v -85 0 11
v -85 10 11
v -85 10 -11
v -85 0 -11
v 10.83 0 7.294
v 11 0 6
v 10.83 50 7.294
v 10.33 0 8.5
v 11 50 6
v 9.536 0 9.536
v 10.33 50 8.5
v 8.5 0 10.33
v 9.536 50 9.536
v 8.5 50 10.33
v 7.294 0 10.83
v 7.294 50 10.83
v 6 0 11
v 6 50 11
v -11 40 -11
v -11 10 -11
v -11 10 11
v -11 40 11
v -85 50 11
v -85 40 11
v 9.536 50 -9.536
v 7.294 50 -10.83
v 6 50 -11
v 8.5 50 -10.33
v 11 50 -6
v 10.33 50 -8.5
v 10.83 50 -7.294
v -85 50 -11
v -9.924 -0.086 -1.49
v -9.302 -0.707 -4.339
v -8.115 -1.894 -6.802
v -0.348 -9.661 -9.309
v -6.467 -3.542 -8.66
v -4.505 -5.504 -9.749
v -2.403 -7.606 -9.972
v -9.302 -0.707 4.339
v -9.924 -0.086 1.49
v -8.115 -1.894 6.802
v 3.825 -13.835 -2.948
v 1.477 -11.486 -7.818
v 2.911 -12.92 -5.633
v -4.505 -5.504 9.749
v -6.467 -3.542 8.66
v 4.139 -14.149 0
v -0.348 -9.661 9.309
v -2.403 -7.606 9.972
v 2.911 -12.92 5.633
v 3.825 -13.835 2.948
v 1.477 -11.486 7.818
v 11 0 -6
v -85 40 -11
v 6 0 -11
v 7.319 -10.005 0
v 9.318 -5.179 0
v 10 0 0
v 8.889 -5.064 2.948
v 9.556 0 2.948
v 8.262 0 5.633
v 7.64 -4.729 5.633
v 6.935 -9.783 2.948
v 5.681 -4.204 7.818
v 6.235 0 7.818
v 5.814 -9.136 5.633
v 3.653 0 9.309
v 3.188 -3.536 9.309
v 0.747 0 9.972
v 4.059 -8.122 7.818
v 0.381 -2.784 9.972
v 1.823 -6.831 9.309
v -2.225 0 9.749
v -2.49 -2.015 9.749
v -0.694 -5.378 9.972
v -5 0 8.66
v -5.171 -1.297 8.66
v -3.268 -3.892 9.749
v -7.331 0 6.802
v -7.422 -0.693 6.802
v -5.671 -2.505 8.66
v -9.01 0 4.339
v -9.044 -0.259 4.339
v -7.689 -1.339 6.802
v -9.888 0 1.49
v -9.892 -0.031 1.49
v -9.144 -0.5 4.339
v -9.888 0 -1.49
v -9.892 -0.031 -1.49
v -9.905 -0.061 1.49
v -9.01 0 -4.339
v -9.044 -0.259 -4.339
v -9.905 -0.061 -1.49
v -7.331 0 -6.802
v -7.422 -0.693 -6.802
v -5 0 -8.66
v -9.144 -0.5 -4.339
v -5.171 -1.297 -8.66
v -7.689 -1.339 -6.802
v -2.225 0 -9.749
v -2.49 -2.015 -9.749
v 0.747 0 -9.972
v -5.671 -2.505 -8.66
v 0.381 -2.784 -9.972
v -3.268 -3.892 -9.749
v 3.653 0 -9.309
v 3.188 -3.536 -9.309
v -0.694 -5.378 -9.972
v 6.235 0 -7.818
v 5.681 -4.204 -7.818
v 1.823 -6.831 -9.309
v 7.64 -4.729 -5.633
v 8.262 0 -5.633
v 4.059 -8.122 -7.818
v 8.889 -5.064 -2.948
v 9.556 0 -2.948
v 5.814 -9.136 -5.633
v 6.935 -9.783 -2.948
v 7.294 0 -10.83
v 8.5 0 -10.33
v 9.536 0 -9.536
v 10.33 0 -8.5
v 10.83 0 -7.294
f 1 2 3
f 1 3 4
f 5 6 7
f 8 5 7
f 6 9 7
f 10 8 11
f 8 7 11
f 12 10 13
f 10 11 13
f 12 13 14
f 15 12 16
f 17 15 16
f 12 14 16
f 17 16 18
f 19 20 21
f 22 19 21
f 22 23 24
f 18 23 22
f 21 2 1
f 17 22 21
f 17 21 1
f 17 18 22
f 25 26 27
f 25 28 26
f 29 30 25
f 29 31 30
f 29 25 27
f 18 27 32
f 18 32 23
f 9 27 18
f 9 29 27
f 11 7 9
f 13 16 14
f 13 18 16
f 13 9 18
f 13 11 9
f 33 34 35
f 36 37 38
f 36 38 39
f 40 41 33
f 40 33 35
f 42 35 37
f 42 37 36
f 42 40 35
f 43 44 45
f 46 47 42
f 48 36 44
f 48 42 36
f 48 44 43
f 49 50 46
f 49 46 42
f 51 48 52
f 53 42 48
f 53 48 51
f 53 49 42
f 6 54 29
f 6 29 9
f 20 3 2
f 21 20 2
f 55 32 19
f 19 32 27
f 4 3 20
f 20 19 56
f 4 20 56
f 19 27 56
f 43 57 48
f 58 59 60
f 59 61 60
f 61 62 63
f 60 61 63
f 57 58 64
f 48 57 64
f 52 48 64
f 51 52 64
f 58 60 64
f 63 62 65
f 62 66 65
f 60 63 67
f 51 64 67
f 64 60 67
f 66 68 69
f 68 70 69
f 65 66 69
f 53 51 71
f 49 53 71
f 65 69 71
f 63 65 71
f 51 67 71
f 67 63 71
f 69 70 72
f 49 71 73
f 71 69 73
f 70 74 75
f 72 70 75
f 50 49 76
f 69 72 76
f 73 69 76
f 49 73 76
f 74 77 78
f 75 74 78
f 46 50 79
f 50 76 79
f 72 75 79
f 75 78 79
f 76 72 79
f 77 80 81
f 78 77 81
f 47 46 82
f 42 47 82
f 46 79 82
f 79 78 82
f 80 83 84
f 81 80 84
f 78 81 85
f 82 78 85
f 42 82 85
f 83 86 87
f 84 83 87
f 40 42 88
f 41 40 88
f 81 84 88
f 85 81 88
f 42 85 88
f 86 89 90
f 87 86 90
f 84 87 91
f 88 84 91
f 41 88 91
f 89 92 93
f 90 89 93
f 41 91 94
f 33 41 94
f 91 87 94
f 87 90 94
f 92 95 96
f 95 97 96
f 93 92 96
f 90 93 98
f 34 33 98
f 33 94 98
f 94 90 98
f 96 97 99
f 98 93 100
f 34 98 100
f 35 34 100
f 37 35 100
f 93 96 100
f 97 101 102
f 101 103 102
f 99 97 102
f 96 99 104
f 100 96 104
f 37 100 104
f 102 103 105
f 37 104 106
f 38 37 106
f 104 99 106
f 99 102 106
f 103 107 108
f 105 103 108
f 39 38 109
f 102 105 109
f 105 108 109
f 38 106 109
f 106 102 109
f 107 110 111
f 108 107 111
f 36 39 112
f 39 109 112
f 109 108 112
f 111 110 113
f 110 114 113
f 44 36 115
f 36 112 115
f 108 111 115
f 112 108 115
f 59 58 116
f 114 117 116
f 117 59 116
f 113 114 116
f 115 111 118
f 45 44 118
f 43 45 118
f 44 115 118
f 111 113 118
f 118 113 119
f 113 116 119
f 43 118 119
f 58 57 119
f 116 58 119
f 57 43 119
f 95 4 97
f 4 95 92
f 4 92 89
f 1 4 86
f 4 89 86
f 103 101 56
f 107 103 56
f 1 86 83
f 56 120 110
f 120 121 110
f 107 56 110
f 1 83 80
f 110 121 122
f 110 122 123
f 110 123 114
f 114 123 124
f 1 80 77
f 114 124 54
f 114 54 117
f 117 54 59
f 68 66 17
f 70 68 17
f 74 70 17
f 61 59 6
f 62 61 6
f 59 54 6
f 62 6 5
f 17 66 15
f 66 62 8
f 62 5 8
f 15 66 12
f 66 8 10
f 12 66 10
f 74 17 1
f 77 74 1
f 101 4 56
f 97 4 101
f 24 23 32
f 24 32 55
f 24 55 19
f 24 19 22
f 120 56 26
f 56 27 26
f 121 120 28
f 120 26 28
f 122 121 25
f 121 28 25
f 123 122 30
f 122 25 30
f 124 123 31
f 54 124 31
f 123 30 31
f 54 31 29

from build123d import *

# Parameters (mm, degrees)
F0_R     = 10
F2_ANGLE = 45
F3_W     = 22
F3_H     = 22
F3_R     = 10
F4_DEPTH = 50
F5_W     = 10
F5_H     = 22
F6_DEPTH = 74
F7_W     = 10
F7_H     = 22
F8_DEPTH = 74
F9_R     = 5


with BuildPart() as f2:
    # F0 (on Front) → F2 (revolve)
    with BuildSketch(Plane.XZ):
        Circle(F0_R)
    revolve(axis=Axis((-10.0093111396, 0, -0.720274169), (0, 0, -1)), revolution_arc=F2_ANGLE)

    # F3 (on face) → F4 (join)
    with BuildSketch(Plane(origin=(0, 0, 0), x_dir=(-1, 0, 0), z_dir=(0, 1, 0))):
        Rectangle(F3_W, F3_H)
        Circle(F3_R, mode=Mode.SUBTRACT)
        Circle(F3_R)
    extrude(amount=F4_DEPTH)

    # F5 (on face) → F6 (join)
    with BuildSketch(Plane(origin=(-11, 0, 0), x_dir=(0, -1, 0), z_dir=(-1, 0, 0))):
        with Locations((-5, 0)):
            Rectangle(F5_W, F5_H)
    extrude(amount=F6_DEPTH)

    # F7 (on face) → F8 (join)
    with BuildSketch(Plane(origin=(-11, 0, 0), x_dir=(0, -1, 0), z_dir=(-1, 0, 0))):
        with Locations((-45, 0)):
            Rectangle(F7_W, F7_H)
    extrude(amount=F8_DEPTH)

    # F9
    f9_edges = [f2.edges().sort_by_distance(p)[0] for p in [
        (11, 25, -11),
        (11, 25, 11),
    ]]
    fillet(f9_edges, radius=F9_R)


solid = f2.part
